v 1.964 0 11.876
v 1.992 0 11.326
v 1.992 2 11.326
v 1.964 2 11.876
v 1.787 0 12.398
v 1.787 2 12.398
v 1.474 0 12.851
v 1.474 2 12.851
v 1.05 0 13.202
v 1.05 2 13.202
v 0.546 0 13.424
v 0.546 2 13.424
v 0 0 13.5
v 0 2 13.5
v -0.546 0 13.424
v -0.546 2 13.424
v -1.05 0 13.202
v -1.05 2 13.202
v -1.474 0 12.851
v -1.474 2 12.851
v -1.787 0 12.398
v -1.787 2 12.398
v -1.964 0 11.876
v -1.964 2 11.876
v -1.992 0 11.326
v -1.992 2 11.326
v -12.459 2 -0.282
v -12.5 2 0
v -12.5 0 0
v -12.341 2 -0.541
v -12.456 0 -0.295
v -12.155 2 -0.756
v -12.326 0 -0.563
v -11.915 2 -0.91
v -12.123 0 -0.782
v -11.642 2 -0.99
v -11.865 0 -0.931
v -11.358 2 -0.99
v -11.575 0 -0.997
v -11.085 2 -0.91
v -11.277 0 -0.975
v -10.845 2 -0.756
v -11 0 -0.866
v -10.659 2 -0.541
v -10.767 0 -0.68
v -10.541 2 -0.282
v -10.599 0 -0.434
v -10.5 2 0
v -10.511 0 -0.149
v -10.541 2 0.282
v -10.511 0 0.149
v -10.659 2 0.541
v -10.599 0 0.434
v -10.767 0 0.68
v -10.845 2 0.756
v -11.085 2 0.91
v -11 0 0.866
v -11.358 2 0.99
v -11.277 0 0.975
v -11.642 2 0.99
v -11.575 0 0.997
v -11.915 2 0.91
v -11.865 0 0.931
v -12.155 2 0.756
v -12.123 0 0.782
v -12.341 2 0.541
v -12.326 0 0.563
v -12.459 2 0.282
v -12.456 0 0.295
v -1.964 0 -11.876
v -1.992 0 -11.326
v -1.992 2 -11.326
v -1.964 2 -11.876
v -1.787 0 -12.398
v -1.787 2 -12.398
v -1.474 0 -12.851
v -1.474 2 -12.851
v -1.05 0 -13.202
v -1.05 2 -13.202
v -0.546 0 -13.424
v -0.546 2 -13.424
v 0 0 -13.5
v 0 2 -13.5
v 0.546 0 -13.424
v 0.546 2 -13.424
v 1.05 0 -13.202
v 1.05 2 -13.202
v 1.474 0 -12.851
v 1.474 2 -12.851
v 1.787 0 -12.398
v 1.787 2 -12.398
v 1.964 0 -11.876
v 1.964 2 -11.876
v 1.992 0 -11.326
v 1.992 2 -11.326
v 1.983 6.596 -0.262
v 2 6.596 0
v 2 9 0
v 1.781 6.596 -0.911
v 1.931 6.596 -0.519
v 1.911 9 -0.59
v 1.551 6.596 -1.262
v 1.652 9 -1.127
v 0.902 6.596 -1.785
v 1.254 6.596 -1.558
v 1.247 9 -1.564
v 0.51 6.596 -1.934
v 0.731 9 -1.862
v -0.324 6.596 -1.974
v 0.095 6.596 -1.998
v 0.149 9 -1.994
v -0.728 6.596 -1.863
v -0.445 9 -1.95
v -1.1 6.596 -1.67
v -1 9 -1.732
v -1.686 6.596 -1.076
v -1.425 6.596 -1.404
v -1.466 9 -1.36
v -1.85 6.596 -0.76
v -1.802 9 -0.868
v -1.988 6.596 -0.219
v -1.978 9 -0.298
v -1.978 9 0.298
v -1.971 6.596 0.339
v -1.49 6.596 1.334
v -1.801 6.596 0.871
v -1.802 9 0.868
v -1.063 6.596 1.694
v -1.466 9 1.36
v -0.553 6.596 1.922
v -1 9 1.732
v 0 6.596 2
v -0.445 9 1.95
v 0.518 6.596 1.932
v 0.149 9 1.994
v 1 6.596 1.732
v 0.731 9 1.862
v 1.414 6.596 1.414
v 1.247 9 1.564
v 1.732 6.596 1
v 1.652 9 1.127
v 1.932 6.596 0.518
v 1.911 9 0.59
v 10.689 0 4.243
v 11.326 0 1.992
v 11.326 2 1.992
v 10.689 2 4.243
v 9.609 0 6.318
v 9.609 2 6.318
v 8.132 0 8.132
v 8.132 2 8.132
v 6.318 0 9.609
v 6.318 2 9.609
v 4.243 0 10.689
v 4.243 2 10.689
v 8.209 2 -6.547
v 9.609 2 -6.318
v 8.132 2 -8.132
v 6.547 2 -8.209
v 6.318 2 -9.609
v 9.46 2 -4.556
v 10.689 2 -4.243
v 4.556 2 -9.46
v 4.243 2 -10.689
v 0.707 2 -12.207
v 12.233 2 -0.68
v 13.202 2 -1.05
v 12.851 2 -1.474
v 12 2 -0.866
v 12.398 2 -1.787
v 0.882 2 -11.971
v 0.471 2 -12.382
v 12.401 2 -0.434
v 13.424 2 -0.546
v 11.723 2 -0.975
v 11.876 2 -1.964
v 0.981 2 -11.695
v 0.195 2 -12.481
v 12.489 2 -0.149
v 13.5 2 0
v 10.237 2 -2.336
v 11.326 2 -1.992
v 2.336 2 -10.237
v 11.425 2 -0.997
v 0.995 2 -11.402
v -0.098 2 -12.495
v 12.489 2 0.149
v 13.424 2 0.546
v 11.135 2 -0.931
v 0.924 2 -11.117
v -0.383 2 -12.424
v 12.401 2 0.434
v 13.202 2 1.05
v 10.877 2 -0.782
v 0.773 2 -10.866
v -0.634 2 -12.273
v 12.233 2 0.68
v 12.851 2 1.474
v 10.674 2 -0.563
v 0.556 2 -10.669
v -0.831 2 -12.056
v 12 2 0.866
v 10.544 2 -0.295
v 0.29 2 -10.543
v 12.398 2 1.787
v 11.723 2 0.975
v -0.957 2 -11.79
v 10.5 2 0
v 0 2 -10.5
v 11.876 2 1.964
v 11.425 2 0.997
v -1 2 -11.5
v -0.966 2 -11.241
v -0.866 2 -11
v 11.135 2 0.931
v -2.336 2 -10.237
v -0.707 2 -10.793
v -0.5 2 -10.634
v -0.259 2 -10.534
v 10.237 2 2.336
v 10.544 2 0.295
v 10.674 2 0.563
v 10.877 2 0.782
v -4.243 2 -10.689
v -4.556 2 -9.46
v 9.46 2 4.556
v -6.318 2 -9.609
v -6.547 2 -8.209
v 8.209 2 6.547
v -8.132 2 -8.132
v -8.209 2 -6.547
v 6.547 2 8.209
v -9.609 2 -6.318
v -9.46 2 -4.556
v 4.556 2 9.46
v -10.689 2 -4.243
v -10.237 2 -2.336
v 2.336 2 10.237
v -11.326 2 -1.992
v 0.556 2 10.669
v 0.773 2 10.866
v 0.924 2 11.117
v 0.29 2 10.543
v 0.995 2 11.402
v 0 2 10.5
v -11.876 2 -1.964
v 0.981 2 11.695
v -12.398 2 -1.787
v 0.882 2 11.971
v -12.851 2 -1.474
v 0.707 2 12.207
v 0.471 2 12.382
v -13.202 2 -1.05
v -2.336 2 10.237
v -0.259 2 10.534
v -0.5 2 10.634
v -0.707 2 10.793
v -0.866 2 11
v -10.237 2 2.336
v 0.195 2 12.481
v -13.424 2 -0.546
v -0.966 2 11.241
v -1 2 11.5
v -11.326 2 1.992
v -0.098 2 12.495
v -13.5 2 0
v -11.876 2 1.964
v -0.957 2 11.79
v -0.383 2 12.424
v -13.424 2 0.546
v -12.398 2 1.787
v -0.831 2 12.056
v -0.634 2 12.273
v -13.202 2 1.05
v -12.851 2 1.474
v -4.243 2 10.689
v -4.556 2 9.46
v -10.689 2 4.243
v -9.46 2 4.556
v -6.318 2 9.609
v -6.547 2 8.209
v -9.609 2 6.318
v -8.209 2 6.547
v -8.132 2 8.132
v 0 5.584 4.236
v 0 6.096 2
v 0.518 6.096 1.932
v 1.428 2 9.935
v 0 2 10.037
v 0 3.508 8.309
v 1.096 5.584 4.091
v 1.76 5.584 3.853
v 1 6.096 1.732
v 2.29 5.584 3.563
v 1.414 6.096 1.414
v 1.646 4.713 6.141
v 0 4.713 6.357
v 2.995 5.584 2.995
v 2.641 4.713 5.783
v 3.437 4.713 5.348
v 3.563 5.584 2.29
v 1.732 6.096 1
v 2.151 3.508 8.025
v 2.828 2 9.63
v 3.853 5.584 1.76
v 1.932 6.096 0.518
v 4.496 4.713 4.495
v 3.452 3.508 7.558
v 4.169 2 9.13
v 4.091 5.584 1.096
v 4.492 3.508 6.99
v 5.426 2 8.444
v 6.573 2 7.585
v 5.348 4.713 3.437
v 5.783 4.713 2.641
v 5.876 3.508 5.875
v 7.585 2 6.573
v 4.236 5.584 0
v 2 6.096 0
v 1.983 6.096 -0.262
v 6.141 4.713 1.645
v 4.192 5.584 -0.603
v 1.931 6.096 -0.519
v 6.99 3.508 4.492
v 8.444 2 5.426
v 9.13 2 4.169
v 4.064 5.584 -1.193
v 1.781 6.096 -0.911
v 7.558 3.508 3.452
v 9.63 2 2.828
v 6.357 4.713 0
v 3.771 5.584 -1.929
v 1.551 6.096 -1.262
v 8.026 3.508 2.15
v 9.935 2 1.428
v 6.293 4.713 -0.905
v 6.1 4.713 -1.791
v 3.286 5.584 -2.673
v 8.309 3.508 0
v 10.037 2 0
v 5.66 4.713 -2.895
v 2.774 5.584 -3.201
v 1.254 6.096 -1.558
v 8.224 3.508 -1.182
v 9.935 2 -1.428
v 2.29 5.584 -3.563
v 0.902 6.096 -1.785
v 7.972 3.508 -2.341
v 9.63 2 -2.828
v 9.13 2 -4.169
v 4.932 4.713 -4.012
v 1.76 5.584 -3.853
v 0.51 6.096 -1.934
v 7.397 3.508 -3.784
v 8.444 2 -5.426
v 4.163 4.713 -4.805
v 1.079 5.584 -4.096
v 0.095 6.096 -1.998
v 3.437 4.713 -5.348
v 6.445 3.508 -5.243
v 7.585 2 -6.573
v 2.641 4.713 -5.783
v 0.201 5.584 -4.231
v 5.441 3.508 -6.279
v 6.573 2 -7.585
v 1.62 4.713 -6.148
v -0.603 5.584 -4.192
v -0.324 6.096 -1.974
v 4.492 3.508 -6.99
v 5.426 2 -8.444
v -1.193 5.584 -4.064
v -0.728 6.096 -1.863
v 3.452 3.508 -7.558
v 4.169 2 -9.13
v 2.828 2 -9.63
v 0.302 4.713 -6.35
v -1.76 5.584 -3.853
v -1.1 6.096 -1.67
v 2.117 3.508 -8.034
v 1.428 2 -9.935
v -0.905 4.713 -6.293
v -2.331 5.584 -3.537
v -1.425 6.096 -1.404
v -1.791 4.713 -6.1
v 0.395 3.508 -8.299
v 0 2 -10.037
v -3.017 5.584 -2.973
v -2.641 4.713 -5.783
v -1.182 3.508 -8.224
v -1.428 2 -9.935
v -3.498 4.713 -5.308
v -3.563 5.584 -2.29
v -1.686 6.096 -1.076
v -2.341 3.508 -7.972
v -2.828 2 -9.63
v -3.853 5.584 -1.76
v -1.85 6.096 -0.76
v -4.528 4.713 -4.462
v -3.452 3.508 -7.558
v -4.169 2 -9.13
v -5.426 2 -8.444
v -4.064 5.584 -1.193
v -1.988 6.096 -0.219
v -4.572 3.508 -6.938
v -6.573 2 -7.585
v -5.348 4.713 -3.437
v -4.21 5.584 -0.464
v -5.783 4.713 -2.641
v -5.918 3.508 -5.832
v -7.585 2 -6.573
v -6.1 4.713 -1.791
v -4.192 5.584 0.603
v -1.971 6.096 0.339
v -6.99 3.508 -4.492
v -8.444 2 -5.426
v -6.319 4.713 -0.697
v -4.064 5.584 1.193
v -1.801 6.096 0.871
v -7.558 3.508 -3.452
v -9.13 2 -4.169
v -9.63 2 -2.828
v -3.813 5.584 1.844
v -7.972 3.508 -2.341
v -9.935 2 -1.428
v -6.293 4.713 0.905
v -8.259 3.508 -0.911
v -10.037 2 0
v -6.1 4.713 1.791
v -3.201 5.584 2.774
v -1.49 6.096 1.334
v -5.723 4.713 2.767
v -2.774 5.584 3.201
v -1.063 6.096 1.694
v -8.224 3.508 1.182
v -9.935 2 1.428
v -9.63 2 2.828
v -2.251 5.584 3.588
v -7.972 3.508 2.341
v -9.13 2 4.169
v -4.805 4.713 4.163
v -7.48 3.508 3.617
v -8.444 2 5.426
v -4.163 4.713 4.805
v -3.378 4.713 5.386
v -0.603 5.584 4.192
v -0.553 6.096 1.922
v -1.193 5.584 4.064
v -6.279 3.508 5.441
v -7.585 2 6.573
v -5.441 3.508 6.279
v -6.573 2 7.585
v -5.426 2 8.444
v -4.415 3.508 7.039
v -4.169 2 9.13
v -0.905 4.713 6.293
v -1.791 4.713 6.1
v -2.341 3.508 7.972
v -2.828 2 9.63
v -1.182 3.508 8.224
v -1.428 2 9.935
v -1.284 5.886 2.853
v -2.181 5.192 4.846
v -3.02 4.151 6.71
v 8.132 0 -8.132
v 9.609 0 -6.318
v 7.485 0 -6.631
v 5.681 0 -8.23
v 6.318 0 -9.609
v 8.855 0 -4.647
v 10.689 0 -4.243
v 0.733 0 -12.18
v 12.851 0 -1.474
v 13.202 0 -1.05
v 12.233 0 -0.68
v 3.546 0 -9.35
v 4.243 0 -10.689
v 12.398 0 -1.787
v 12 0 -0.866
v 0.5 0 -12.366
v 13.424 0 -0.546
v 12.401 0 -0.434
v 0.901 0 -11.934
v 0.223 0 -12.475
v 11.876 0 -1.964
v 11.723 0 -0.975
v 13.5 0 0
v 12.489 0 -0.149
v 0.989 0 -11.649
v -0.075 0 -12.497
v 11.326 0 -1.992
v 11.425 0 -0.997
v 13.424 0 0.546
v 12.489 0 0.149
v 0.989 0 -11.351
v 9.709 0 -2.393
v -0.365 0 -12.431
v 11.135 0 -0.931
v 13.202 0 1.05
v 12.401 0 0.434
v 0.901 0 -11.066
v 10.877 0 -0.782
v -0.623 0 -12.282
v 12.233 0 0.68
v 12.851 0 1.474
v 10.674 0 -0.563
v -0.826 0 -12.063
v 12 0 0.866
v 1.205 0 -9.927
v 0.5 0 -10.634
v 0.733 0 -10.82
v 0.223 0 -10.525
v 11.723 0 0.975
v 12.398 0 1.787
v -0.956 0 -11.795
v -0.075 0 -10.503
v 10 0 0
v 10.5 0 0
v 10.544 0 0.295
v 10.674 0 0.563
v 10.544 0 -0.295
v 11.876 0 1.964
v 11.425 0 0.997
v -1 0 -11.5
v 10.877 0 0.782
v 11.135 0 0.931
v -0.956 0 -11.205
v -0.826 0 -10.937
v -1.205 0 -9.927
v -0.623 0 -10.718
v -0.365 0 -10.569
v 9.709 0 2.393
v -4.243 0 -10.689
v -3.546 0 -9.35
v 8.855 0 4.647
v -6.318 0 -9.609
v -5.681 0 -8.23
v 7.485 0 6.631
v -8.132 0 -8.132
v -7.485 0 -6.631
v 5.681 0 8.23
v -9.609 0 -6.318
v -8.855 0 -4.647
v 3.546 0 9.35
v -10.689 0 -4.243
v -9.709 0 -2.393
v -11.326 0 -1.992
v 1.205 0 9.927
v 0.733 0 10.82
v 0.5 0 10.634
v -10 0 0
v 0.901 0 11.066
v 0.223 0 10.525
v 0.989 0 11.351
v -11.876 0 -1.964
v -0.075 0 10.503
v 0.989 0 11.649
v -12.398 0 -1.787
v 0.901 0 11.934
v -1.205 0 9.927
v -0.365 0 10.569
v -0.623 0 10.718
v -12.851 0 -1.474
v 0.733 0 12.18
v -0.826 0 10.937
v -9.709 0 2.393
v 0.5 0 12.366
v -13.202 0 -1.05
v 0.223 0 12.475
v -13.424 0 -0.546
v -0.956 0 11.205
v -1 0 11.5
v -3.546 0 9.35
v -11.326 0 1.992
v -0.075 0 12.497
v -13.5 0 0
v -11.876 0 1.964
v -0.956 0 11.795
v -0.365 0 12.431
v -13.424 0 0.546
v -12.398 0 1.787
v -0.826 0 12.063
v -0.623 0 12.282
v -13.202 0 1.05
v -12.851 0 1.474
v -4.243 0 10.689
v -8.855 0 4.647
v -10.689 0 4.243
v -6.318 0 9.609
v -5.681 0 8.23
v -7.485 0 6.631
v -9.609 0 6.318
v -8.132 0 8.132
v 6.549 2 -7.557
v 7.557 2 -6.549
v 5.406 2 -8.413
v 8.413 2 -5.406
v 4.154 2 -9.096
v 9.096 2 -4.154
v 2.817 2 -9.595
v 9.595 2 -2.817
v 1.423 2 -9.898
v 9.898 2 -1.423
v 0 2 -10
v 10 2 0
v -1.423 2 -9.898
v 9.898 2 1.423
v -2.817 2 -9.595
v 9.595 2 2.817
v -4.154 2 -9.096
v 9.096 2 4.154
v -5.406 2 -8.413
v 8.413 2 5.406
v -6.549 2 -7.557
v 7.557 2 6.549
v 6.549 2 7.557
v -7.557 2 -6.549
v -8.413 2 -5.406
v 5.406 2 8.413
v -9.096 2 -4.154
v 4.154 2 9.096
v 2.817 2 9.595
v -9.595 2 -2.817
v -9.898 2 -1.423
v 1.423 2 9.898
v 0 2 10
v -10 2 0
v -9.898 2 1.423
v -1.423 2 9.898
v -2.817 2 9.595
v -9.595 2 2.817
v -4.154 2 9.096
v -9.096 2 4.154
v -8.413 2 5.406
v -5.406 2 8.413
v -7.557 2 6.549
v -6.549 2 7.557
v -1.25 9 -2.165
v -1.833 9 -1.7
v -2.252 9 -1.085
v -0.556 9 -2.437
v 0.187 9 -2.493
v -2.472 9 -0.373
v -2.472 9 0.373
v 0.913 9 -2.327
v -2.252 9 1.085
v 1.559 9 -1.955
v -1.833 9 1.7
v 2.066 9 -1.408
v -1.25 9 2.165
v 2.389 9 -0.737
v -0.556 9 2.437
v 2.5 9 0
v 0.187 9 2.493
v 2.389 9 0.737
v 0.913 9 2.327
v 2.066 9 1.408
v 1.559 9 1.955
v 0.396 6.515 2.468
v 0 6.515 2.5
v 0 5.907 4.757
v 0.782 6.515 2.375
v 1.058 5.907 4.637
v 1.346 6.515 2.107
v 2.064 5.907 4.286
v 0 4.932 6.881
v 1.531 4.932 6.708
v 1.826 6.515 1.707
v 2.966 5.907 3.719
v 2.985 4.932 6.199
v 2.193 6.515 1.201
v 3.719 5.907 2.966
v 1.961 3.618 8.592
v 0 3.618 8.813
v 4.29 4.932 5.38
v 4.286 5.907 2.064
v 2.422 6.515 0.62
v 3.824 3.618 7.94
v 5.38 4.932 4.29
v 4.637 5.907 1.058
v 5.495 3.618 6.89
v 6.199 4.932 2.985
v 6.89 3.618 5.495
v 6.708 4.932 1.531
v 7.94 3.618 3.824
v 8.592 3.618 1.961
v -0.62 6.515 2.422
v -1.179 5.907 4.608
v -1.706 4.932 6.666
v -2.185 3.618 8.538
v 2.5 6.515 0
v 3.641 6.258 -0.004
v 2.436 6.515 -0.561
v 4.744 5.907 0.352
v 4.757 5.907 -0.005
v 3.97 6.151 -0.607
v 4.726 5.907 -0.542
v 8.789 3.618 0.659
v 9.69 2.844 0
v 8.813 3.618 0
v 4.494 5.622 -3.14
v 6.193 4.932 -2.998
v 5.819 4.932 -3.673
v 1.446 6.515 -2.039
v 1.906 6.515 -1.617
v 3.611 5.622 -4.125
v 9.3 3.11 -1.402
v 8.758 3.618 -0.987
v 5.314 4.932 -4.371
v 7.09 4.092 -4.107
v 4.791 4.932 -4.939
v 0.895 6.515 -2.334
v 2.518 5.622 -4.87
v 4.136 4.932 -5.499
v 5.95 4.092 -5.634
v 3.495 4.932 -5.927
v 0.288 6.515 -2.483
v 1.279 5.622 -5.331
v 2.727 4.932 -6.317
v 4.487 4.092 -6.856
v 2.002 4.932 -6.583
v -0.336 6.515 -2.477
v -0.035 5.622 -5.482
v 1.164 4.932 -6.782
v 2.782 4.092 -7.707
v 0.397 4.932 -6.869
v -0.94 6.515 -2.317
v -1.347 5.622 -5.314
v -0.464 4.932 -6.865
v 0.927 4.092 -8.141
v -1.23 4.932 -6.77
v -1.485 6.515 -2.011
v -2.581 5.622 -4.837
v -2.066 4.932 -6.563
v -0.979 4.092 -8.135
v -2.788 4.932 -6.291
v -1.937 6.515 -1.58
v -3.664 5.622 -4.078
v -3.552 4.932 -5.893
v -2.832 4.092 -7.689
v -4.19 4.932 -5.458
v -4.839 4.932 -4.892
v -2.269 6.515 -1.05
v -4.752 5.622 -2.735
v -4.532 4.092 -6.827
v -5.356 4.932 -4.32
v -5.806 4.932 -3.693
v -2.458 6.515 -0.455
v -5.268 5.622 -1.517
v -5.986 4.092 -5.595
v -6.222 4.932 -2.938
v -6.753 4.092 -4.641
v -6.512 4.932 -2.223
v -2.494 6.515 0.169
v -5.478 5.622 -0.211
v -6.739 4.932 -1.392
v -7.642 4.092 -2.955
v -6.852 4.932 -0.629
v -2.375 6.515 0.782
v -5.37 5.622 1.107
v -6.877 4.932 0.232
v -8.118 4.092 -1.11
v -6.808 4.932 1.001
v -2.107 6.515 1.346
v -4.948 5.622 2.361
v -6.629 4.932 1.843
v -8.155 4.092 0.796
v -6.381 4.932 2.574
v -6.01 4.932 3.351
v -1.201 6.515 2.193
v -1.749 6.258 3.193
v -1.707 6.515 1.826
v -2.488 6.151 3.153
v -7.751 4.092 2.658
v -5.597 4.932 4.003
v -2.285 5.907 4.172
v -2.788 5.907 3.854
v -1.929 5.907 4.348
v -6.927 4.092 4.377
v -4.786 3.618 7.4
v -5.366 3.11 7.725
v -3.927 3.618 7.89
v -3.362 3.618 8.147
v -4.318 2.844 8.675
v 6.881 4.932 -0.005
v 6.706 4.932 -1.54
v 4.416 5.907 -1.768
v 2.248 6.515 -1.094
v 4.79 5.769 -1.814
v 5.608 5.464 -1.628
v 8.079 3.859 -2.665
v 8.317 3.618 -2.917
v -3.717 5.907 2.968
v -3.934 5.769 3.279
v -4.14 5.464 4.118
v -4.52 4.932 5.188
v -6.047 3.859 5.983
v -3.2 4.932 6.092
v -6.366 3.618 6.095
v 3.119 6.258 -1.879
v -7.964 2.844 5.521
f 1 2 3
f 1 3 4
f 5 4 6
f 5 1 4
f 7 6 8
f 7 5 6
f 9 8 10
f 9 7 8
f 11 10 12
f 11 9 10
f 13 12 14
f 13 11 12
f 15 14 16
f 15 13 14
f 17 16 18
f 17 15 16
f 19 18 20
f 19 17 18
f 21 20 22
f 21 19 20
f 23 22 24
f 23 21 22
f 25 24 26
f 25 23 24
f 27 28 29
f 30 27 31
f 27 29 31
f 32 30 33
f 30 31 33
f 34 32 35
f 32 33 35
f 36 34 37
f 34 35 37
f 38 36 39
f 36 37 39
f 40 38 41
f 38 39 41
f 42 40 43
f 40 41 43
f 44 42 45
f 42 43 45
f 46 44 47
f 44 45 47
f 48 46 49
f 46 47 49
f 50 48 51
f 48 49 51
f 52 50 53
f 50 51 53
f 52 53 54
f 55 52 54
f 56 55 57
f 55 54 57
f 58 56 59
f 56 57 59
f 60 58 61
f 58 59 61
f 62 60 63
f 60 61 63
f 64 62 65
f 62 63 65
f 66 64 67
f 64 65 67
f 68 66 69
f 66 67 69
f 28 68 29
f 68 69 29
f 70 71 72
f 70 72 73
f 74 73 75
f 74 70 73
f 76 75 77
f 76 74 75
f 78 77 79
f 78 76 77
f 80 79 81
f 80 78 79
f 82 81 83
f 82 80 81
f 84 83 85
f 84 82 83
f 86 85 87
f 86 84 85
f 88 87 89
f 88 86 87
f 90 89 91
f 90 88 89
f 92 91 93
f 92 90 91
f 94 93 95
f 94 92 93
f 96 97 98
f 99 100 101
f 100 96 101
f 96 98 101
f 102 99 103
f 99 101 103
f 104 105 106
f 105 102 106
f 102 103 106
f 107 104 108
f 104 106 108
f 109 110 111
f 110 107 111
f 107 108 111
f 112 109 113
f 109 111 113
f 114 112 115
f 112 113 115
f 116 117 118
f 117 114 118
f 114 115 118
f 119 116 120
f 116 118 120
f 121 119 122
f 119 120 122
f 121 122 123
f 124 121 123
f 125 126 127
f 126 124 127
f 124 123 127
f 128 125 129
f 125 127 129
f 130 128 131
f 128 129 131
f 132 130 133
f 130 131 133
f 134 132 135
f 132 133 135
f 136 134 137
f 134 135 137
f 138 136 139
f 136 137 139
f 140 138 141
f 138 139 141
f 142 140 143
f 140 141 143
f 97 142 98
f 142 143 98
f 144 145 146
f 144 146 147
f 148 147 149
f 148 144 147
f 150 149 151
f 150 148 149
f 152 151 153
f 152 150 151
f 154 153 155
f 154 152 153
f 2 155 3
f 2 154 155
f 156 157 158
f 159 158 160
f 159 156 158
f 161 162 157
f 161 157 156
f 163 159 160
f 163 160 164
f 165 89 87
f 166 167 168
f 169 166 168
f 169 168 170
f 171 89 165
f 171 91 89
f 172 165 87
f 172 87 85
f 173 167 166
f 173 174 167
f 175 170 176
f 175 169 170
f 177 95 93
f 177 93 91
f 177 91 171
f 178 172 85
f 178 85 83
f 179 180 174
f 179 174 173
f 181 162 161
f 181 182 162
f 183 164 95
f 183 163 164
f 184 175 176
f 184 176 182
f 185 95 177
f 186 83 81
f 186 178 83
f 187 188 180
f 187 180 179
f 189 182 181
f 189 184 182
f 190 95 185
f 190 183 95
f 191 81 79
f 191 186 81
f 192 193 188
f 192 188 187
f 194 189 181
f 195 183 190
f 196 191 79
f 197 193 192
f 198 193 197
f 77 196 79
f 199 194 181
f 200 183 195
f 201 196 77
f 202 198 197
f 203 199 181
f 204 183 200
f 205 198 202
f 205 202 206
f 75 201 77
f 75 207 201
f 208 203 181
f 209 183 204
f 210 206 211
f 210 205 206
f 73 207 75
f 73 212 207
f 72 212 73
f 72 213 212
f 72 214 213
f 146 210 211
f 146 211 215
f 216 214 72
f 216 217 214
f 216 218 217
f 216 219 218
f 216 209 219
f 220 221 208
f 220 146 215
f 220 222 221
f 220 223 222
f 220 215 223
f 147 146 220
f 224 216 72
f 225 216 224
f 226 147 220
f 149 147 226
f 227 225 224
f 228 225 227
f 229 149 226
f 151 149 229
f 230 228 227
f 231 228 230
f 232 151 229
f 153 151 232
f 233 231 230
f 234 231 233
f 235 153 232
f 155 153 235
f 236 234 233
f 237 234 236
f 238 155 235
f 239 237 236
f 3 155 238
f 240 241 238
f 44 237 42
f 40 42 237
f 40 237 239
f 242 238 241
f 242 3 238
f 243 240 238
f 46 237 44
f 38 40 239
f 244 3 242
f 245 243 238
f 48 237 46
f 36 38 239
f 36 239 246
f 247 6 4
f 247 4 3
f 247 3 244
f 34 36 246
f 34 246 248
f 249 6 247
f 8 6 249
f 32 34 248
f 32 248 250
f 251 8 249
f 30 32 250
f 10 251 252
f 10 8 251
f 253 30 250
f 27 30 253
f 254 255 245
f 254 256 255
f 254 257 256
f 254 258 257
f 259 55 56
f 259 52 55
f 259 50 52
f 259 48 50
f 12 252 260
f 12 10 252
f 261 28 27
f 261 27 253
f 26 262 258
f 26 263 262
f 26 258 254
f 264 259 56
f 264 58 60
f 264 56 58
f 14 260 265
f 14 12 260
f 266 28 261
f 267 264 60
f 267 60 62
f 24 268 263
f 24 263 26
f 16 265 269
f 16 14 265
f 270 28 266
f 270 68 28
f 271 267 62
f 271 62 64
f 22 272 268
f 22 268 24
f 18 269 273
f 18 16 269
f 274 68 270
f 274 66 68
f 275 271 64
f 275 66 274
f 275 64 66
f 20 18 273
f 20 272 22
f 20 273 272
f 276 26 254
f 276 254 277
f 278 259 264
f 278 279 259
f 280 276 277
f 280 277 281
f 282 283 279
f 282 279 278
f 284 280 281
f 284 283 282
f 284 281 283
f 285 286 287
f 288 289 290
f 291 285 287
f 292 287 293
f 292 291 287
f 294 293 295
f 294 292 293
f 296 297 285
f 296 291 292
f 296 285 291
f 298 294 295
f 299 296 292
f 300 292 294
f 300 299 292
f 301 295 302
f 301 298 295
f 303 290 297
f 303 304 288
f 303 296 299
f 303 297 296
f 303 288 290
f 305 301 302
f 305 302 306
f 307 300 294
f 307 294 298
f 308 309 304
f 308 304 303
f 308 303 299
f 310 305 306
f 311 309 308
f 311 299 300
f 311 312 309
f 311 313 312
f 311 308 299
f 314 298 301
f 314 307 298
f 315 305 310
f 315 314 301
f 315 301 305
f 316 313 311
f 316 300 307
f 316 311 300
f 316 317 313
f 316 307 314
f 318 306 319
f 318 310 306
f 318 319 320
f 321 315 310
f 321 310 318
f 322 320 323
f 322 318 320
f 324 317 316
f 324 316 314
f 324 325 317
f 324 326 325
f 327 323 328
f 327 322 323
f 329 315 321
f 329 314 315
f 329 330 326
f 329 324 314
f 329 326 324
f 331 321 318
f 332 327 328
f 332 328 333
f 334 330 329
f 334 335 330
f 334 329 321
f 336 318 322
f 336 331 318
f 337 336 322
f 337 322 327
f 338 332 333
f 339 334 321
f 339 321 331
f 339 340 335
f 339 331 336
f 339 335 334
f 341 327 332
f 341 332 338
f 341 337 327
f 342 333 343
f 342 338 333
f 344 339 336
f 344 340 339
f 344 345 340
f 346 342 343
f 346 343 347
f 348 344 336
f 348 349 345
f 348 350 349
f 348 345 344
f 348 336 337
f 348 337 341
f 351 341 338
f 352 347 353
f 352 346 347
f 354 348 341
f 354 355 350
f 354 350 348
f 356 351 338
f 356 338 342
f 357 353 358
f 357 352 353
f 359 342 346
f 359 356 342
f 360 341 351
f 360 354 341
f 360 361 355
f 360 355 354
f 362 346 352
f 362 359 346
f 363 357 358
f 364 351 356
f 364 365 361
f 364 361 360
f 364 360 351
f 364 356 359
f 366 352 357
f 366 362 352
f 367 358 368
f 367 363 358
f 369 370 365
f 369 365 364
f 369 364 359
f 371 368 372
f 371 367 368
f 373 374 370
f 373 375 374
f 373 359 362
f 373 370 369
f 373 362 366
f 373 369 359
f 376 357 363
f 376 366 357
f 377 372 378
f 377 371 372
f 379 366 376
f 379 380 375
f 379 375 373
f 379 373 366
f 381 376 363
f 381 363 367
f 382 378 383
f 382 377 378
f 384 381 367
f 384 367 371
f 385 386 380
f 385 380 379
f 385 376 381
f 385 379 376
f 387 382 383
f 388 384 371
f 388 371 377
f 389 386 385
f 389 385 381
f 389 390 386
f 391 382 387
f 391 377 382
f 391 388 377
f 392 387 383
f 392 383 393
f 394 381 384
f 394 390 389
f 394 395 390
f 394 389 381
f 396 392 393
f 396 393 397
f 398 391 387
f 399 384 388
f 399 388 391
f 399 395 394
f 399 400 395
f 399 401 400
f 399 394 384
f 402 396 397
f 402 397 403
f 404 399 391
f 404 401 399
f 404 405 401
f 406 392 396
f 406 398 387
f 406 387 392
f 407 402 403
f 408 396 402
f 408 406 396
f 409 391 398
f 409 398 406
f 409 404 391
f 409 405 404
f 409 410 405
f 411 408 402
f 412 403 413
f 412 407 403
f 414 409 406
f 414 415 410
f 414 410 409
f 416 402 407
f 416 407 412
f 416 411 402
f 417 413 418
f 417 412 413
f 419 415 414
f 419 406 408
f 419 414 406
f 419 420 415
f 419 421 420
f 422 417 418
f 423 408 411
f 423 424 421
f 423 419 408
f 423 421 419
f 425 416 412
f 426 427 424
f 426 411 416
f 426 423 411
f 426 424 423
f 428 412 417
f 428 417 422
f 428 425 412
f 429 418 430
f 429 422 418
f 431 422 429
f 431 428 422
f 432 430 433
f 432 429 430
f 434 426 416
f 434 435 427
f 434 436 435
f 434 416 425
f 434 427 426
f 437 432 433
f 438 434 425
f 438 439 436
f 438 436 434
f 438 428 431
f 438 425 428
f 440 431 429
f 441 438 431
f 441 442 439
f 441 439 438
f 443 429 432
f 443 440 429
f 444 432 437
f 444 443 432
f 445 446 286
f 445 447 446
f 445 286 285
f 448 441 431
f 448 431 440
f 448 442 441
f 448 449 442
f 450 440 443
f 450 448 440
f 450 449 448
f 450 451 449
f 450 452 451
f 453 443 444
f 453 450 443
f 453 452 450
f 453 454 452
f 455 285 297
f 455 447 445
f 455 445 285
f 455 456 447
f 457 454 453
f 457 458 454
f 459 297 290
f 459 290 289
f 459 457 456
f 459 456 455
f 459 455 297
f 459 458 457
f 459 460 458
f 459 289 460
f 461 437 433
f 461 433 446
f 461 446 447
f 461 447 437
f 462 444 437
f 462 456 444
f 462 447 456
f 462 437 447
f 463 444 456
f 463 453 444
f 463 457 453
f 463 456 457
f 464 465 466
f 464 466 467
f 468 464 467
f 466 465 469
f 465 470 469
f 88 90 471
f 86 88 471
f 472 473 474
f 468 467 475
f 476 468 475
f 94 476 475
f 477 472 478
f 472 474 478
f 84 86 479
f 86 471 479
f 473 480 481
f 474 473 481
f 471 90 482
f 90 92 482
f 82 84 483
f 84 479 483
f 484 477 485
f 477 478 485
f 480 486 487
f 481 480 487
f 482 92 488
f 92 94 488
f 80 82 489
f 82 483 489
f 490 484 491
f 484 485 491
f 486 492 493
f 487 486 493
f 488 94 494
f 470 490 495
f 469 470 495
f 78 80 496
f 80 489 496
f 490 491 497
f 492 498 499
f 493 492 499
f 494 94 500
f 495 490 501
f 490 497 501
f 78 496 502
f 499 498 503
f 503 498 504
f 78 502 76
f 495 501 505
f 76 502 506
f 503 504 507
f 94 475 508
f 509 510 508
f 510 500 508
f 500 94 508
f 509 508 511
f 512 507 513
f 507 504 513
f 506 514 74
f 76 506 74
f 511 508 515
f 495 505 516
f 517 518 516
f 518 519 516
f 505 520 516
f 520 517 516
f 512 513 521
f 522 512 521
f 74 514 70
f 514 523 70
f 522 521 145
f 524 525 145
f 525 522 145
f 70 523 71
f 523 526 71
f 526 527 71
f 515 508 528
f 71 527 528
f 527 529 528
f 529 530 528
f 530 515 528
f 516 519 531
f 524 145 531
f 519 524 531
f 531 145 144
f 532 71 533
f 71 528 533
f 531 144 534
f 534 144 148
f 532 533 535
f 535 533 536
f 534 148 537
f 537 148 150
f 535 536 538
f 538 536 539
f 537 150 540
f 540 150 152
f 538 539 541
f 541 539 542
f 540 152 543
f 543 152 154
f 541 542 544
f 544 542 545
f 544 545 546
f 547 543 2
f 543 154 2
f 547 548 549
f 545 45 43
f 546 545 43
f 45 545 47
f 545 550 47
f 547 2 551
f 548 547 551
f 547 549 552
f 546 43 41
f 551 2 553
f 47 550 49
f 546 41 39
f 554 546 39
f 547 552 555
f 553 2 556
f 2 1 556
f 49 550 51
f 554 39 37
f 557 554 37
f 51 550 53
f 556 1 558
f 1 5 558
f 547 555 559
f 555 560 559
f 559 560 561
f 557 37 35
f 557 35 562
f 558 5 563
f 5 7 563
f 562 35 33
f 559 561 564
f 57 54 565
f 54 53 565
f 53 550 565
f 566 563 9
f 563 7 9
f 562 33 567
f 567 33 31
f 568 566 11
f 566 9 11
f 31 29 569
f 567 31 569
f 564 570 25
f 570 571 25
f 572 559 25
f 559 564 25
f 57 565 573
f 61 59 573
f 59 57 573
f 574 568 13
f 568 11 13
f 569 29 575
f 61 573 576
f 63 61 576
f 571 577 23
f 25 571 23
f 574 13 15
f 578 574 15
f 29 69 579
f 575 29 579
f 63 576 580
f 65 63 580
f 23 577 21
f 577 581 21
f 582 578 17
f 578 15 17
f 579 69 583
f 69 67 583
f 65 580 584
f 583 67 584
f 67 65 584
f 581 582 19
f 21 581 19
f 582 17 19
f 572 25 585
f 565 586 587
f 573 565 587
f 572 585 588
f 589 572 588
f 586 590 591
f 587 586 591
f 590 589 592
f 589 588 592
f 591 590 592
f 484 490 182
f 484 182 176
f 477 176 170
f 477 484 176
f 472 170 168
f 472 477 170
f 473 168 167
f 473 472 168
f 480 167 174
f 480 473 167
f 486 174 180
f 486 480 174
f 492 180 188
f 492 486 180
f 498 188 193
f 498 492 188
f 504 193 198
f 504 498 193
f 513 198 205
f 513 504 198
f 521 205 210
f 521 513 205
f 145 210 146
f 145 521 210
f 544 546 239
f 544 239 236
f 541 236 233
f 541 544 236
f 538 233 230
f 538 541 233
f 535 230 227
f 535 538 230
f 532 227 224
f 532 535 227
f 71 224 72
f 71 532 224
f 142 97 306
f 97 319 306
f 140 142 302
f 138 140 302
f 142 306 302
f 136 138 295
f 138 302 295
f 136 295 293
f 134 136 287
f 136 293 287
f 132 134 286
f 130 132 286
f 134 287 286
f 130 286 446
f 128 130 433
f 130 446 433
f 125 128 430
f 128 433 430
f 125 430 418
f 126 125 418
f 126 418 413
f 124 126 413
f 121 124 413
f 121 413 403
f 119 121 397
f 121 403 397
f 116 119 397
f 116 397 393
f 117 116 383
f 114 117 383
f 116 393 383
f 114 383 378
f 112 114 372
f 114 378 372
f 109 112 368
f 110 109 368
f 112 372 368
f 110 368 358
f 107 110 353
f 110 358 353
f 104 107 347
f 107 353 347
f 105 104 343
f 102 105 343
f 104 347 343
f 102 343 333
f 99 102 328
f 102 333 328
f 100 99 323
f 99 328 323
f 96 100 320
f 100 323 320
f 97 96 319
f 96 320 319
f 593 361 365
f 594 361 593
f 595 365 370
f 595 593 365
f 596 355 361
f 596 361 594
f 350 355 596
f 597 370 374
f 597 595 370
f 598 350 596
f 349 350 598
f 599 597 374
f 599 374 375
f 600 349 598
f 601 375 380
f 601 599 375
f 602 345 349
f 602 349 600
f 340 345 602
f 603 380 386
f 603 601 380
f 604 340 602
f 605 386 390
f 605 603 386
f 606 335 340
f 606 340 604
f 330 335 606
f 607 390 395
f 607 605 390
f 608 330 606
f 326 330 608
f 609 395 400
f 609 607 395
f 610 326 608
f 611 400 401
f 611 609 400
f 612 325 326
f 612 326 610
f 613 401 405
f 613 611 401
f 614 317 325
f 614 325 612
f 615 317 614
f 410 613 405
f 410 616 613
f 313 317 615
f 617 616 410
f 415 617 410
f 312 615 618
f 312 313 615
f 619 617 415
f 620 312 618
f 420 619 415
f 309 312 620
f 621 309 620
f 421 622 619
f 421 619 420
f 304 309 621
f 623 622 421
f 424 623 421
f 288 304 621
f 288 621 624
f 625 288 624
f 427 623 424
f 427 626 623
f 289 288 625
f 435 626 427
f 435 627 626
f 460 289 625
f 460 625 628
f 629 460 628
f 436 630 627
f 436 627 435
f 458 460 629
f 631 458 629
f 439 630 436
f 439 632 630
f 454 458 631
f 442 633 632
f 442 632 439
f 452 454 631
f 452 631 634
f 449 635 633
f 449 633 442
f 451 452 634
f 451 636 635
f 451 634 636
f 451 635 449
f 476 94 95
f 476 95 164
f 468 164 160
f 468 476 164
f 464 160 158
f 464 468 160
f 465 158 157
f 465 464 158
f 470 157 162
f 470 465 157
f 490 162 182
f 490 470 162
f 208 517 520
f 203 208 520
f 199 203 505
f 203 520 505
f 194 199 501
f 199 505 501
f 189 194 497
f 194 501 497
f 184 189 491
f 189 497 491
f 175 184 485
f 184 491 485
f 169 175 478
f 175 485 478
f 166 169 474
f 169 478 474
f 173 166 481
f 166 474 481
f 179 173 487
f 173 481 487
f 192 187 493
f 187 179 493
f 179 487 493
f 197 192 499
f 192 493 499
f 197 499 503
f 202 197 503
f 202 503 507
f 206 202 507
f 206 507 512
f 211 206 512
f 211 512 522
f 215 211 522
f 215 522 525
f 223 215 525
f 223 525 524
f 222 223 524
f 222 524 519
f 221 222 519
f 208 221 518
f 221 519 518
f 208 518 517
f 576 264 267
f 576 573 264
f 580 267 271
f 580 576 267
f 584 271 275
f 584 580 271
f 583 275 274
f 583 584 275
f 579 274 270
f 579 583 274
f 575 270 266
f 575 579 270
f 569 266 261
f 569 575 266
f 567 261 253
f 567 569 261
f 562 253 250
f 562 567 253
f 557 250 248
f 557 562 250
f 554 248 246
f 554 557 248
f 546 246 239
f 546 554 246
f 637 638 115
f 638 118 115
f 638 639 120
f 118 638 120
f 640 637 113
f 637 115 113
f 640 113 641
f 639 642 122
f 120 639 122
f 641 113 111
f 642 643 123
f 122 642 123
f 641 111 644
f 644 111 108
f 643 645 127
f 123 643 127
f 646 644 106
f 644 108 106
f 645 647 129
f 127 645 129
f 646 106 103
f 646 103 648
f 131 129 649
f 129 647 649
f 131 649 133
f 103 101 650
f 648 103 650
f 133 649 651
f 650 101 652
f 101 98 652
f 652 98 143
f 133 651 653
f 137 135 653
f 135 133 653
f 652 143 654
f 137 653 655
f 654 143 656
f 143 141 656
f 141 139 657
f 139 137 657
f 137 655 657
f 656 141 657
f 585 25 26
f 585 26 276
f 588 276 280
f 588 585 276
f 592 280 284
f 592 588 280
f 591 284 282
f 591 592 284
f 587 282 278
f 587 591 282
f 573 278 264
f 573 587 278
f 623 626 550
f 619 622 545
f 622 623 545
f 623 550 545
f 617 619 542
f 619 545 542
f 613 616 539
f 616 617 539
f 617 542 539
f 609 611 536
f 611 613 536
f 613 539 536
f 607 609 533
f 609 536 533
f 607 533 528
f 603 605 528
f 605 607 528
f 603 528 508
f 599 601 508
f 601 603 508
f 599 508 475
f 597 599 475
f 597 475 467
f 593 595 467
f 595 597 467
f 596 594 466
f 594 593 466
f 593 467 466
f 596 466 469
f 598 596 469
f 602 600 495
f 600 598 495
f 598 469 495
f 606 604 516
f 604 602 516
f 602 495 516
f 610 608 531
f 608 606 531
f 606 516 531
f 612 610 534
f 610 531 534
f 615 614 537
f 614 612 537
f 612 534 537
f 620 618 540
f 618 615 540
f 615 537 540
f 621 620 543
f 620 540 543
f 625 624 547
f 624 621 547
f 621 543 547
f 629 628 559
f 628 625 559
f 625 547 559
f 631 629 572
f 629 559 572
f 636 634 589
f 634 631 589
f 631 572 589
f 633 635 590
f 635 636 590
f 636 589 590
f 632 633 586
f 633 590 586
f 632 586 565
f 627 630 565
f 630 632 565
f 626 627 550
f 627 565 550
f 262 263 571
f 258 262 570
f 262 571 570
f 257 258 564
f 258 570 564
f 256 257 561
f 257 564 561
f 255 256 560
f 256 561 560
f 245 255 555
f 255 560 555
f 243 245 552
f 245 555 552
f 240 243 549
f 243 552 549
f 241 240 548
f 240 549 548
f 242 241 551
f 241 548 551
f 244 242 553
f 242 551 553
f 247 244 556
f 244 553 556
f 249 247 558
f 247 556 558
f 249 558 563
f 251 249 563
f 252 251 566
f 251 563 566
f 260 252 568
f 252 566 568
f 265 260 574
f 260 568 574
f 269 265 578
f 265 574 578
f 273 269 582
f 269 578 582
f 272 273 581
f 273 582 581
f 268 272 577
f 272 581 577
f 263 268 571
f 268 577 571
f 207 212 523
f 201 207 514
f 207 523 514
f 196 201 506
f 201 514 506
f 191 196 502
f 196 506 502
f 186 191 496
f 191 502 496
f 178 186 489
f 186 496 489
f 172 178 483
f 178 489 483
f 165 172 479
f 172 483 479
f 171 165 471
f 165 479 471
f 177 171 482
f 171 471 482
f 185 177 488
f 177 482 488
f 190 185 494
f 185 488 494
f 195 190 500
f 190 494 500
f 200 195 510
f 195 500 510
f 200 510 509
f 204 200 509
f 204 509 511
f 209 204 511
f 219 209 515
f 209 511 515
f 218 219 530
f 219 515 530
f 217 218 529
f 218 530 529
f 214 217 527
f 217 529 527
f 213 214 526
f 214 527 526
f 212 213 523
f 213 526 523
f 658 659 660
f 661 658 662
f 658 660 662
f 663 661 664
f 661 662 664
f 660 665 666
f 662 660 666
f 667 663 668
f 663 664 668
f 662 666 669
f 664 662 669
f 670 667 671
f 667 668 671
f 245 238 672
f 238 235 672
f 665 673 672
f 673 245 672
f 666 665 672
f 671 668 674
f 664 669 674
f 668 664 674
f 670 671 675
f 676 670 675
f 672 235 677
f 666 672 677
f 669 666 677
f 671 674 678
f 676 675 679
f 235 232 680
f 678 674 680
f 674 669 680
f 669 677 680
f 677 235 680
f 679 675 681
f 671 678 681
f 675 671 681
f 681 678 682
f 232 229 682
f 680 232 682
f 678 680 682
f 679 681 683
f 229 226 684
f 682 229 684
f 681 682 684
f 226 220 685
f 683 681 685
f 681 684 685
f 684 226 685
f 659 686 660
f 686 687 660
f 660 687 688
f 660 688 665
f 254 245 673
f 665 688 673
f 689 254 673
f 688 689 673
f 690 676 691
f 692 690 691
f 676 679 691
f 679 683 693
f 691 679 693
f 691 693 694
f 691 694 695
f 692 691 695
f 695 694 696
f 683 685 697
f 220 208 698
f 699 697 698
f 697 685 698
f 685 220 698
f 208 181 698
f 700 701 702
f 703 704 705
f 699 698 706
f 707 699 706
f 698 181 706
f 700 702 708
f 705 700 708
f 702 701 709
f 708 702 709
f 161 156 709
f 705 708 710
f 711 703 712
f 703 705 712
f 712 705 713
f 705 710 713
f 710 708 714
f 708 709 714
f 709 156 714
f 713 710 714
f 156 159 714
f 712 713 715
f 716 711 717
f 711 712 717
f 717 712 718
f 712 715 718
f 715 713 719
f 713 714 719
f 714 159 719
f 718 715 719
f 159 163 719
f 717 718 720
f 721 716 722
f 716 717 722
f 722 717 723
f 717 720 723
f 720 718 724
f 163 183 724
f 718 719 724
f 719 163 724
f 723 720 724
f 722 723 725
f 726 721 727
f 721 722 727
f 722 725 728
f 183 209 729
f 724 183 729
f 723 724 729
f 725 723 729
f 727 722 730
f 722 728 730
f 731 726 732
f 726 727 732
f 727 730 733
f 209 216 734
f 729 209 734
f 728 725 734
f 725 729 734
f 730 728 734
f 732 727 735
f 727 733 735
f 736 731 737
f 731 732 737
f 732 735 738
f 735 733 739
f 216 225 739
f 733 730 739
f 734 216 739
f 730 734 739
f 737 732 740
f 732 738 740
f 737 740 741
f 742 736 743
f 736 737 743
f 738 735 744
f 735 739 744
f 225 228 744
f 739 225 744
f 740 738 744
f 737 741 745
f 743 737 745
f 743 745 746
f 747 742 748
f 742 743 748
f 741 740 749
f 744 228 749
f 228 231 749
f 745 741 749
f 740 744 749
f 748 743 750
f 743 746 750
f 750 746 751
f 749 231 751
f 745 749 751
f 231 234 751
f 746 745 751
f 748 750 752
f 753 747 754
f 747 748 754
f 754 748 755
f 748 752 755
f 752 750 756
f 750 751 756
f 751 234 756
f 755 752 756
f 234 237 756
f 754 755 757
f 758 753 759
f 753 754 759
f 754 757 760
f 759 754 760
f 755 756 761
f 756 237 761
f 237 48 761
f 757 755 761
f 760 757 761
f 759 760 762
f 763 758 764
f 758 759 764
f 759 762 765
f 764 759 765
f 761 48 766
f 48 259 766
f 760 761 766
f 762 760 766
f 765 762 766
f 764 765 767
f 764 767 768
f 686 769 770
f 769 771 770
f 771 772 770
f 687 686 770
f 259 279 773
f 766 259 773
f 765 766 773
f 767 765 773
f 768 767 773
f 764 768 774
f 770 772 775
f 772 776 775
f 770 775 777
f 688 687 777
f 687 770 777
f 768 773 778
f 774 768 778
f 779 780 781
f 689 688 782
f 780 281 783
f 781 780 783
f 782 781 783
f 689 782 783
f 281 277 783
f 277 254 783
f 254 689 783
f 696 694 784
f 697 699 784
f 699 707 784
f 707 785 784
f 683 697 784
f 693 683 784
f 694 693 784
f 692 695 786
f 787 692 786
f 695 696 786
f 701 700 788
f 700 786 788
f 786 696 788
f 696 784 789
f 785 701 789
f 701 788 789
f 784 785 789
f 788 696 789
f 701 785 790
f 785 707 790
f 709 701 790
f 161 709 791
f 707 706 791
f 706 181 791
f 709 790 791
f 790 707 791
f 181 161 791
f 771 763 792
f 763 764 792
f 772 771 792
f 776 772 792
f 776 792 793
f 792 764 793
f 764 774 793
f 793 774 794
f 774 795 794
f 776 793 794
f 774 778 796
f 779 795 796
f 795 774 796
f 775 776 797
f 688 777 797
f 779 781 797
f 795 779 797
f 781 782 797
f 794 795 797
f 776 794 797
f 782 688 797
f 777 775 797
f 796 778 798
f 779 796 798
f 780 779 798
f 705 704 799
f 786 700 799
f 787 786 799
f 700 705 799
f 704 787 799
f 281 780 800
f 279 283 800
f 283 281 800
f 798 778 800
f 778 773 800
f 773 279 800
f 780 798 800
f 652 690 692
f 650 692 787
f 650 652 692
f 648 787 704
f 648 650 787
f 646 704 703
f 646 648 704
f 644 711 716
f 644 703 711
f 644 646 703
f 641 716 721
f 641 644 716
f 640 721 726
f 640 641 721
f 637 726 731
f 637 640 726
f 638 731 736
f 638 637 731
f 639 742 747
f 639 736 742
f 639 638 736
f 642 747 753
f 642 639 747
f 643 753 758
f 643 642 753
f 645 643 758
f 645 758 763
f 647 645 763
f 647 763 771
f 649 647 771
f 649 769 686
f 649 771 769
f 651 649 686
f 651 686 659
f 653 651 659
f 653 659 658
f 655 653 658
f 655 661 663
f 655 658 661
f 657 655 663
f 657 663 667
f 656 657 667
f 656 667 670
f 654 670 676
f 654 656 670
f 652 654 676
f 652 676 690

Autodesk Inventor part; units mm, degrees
ref_plane "YZ Plane" through (0, 0, 0) normal (1, 0, 0) x (0, 1, 0)
ref_plane "XZ Plane" through (0, 0, 0) normal (0, 1, 0) x (-1, 0, 0)
sketch "Sketch1" plane through (0, 0, 0) normal (0, 1, 0) x (-1, 0, 0)
  circle A0 centre (0, 0) radius 12.5 construction
  line L0 (12.5, 0) -> (-12.5, 0) construction
  line L1 (0, -12.5) -> (0, 12.5) construction
  circle A1 centre (-11.5, 0) radius 1
  circle A2 centre (0, -11.5) radius 1
  circle A3 centre (11.5, 0) radius 1
  circle A4 centre (0, 11.5) radius 1
  circle A5 centre (0, 0) radius 10
  arc A6 (-1.9924, -11.3261) -> (1.9924, -11.3261) centre (0, -11.5) ccw
  arc A7 (-11.3261, 1.9924) -> (-11.3261, -1.9924) centre (-11.5, 0) ccw
  arc A8 (1.9924, 11.3261) -> (-1.9924, 11.3261) centre (0, 11.5) ccw
  arc A9 (11.3261, -1.9924) -> (11.3261, 1.9924) centre (11.5, 0) ccw
  arc A10 (0.9991, -11.4565) -> (11.3261, -1.9924) centre (0, 0) ccw construction
  arc A11 (1.9924, -11.3261) -> (11.3261, -1.9924) centre (0, 0) ccw
  arc A12 (11.3261, 1.9924) -> (1.9924, 11.3261) centre (0, 0) ccw construction
  arc A13 (11.3261, 1.9924) -> (1.9924, 11.3261) centre (0, 0) ccw
  arc A14 (-1.9924, 11.3261) -> (-11.3261, 1.9924) centre (0, 0) ccw construction
  arc A15 (-1.9924, 11.3261) -> (-11.3261, 1.9924) centre (0, 0) ccw
  arc A16 (-11.3261, -1.9924) -> (-1.9924, -11.3261) centre (0, 0) ccw construction
  arc A17 (-11.3261, -1.9924) -> (-1.9924, -11.3261) centre (0, 0) ccw
  line L2 (0, -10) -> (-9.6532, -10) construction
  point P0 (0, 0)
  point P1 (0, 0)
  dimension "d1" = 2
  dimension "d2" = 20
  dimension "d0" = 25
  dimension "d3" = 2
  dimension "d4" = 11.5
  dimension "d5" = 11.5
  dimension "d6" = 11.5
  dimension "d7" = 11.5
extrude "Extrusion1" add sketch "Sketch1" along normal blind 2
sketch "Sketch2" plane through (0, 0, 0) normal (1, 0, 0) x (0, 1, 0)
  line L0 (0, 0) -> (6.7399, 0) construction
  line L1 (2, 10.5) -> (0, 10.5) projected
  arc A0 (6.7399, 0) -> (2, 10.5) centre (-7.2601, 0) ccw
  line L2 (2, 10) -> (0, 10) projected
  arc A1 (6.2399, 0) -> (2, 10.0369) centre (-7.7601, 0) ccw
  line L3 (6.7399, 0) -> (6.7399, 0.4008)
  line L4 (2, 12.5) -> (2, 10.5) projected
  line L5 (2, 10) -> (2, 10.5)
  line L6 (0, 0) -> (-7.5749, 0) construction
  line L7 (6.7399, 0) -> (6.2399, 0)
  dimension "d10" = 14
  dimension "d11" = 0.5
  dimension "d12" = 14
revolve "Revolution1" add sketch "Sketch2" angle 360 about axis through (0, 0, 0) along (0, 1, 0)
sketch "Sketch3" plane through (0, 0, 0) normal (0, -1, 0) x (1, 0, 0)
  circle A0 centre (0, 0) radius 2
  dimension "d14" = 4
extrude "Extrusion2" cut sketch "Sketch3" against normal up to surface
ref_plane "Work Plane1" through (0, 9, 0) normal (0, -1, 0) x (1, 0, 0)
sketch "Sketch5" plane through (0, 9, 0) normal (0, -1, 0) x (1, 0, 0)
  circle A0 centre (0, 0) radius 2
  circle A1 centre (0, 0) radius 2.5
  dimension "d20" = 5
  dimension "d21" = 4
extrude "Extrusion3" add sketch "Sketch5" along normal up to surface
properties part number "_3DPrint"
